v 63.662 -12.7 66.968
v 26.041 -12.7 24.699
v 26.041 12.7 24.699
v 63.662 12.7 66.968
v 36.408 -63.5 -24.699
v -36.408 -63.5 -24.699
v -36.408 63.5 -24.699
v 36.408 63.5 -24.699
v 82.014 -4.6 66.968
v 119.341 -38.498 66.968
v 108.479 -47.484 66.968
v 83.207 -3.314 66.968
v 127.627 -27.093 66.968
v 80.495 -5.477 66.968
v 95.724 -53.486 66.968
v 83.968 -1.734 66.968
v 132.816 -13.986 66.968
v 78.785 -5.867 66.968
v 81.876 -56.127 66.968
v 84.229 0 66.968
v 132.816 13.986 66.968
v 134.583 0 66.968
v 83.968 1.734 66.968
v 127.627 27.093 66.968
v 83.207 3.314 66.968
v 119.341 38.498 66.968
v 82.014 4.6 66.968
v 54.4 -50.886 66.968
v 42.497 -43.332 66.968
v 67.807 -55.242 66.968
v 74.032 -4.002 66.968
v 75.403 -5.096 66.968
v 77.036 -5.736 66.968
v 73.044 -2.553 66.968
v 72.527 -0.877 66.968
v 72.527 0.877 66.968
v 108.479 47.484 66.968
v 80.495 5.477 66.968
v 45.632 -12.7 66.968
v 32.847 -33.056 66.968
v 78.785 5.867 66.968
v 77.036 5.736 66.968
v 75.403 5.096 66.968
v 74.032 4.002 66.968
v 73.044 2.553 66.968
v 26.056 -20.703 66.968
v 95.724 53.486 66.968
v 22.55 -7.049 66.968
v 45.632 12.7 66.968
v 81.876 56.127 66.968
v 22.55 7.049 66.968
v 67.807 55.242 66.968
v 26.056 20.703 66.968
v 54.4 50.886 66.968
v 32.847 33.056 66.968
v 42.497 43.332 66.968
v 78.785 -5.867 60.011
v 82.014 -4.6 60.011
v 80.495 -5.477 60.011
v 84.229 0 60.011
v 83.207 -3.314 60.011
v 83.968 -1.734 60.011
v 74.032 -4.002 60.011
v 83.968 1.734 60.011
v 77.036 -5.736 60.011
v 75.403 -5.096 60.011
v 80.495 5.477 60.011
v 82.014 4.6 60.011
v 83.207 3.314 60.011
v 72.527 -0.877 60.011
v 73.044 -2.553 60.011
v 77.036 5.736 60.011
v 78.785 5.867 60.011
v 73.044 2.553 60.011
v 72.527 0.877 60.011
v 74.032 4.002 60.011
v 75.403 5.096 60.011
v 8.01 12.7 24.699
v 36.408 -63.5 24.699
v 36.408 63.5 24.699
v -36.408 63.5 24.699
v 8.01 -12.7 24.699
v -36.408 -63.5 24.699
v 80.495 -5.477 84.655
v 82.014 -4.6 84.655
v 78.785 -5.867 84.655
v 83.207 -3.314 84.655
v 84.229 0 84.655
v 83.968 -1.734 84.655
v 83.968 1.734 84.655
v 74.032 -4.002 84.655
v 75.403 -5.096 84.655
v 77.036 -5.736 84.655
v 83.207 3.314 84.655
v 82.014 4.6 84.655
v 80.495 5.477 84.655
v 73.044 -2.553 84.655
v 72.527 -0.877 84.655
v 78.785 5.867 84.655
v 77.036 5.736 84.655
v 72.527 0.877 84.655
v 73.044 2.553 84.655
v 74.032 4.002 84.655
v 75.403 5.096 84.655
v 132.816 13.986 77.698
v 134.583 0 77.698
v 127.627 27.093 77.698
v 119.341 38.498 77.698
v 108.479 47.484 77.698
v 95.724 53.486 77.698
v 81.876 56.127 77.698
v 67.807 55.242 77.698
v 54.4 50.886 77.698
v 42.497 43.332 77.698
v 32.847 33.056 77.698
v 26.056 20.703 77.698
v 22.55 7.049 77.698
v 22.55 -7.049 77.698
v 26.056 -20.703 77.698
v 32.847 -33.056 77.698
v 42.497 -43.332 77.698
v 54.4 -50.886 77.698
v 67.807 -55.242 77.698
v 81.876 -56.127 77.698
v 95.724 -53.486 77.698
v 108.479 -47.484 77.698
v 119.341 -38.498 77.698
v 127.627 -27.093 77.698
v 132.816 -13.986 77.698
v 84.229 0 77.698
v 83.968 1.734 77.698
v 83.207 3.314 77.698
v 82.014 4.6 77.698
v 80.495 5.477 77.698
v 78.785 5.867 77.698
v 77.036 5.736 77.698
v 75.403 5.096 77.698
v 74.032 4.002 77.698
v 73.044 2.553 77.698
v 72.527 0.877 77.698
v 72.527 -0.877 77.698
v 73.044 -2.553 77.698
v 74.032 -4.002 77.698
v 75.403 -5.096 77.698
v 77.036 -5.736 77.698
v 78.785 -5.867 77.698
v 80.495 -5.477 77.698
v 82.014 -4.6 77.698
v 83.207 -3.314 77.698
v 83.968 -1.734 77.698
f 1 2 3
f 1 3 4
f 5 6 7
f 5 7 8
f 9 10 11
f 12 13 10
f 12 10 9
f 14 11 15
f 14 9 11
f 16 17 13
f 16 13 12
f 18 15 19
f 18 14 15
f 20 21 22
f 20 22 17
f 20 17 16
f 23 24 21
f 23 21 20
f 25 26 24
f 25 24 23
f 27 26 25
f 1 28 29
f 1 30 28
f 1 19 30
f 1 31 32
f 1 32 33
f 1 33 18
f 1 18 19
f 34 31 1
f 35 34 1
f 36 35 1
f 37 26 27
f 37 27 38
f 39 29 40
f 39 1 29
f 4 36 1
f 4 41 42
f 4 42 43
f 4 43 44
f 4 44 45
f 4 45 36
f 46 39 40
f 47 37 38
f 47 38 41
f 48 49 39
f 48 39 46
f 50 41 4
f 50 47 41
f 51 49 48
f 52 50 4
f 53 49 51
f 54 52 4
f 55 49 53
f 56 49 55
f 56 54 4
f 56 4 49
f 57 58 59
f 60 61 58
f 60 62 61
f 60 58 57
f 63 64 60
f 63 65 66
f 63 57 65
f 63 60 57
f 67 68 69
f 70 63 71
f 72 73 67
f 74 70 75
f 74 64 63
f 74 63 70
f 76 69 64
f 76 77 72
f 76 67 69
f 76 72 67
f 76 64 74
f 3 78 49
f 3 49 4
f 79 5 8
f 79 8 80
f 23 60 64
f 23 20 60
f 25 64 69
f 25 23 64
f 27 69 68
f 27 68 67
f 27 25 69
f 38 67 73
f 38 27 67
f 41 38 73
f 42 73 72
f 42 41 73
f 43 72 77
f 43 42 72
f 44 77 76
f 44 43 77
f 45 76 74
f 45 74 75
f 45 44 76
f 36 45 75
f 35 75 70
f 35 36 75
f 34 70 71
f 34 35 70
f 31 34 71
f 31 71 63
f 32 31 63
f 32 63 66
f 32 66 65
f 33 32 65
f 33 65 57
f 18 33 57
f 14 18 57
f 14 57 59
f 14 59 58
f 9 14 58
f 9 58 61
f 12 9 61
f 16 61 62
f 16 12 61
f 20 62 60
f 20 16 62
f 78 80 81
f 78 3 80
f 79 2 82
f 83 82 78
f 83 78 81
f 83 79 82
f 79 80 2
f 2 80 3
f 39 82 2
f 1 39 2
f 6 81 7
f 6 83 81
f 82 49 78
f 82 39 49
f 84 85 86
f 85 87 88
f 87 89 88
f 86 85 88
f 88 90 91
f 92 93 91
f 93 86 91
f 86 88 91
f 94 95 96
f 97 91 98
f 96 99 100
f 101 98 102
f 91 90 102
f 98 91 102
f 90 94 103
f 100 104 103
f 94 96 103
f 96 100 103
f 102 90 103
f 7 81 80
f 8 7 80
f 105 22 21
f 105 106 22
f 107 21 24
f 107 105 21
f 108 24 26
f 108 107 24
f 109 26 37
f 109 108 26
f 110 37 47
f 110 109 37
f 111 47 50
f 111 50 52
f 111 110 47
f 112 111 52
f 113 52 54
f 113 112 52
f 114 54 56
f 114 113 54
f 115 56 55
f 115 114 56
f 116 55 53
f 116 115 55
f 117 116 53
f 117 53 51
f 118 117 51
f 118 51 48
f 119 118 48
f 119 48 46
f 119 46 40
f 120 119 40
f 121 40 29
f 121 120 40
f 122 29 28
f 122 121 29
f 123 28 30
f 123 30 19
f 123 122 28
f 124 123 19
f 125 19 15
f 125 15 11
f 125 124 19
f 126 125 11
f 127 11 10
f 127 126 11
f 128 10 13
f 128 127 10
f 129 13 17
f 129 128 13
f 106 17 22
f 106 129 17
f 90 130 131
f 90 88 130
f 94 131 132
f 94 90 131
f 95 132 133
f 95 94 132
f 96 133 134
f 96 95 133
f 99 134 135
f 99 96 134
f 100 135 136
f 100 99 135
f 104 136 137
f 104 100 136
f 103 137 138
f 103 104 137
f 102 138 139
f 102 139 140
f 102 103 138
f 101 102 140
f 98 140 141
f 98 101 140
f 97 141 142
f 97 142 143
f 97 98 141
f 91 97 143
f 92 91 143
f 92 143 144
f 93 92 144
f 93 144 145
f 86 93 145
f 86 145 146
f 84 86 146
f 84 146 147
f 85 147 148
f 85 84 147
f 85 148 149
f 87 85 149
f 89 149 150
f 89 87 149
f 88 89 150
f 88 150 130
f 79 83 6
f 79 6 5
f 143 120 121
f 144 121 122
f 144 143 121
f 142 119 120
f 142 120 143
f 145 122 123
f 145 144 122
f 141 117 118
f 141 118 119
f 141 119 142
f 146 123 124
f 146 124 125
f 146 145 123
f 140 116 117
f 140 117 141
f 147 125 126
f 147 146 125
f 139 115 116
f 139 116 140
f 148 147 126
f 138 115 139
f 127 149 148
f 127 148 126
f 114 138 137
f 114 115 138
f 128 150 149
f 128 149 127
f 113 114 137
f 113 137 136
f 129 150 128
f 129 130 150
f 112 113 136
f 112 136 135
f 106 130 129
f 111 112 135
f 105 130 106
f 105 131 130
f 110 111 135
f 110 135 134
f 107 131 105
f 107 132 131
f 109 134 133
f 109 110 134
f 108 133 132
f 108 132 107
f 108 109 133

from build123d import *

# Parameters (mm, degrees)
F1_DEPTH = 63.5
F2_DEPTH = 12.7
F0_W     = 50.3543876112
F0_H     = 10.7296556234
F0_W_2   = 5.8838576078
F0_H_2   = 6.9569721818


with BuildPart() as f1:
    # F0 (on Front) → F1 (new body, symmetric)
    with BuildSketch(Plane.XZ):
        Polygon((26.0407731761, 24.6988553554), (8.0104582012, 24.6988553554), (-36.4082939923, 24.6988553554), (-36.4082939923, -24.6988553554), (36.4082939923, -24.6988553554), (36.4082939923, 24.6988553554), align=None)
    extrude(amount=F1_DEPTH, both=True)

    # F0 (on Front) → F2 (join, symmetric)
    with BuildSketch(Plane.XZ):
        Polygon((45.6321343976, 66.9679120183), (8.0104582012, 24.6988553554), (26.0407731761, 24.6988553554), (63.6624493725, 66.9679120183), align=None)
    extrude(amount=F2_DEPTH, both=True)

    # F0 (on Front) → F3 (revolve)
    with BuildSketch(Plane.XZ):
        with Locations((109.4061043113, 72.33273983)):
            Rectangle(F0_W, F0_H)
        Polygon((78.3450528979, 72.33273983), (78.3450528979, 66.9679120183), (84.2289105058, 66.9679120183), (84.2289105058, 77.6975676417), (78.3450528979, 77.6975676417), align=None)
        with Locations((81.2869817019, 63.4894259274)):
            Rectangle(F0_W_2, F0_H_2)
        with Locations((81.2869817019, 81.1760537326)):
            Rectangle(F0_W_2, F0_H_2)
    revolve(axis=Axis((78.3450528979, 0, 78.4936398268), (0, 0, 1)))


solid = f1.part
